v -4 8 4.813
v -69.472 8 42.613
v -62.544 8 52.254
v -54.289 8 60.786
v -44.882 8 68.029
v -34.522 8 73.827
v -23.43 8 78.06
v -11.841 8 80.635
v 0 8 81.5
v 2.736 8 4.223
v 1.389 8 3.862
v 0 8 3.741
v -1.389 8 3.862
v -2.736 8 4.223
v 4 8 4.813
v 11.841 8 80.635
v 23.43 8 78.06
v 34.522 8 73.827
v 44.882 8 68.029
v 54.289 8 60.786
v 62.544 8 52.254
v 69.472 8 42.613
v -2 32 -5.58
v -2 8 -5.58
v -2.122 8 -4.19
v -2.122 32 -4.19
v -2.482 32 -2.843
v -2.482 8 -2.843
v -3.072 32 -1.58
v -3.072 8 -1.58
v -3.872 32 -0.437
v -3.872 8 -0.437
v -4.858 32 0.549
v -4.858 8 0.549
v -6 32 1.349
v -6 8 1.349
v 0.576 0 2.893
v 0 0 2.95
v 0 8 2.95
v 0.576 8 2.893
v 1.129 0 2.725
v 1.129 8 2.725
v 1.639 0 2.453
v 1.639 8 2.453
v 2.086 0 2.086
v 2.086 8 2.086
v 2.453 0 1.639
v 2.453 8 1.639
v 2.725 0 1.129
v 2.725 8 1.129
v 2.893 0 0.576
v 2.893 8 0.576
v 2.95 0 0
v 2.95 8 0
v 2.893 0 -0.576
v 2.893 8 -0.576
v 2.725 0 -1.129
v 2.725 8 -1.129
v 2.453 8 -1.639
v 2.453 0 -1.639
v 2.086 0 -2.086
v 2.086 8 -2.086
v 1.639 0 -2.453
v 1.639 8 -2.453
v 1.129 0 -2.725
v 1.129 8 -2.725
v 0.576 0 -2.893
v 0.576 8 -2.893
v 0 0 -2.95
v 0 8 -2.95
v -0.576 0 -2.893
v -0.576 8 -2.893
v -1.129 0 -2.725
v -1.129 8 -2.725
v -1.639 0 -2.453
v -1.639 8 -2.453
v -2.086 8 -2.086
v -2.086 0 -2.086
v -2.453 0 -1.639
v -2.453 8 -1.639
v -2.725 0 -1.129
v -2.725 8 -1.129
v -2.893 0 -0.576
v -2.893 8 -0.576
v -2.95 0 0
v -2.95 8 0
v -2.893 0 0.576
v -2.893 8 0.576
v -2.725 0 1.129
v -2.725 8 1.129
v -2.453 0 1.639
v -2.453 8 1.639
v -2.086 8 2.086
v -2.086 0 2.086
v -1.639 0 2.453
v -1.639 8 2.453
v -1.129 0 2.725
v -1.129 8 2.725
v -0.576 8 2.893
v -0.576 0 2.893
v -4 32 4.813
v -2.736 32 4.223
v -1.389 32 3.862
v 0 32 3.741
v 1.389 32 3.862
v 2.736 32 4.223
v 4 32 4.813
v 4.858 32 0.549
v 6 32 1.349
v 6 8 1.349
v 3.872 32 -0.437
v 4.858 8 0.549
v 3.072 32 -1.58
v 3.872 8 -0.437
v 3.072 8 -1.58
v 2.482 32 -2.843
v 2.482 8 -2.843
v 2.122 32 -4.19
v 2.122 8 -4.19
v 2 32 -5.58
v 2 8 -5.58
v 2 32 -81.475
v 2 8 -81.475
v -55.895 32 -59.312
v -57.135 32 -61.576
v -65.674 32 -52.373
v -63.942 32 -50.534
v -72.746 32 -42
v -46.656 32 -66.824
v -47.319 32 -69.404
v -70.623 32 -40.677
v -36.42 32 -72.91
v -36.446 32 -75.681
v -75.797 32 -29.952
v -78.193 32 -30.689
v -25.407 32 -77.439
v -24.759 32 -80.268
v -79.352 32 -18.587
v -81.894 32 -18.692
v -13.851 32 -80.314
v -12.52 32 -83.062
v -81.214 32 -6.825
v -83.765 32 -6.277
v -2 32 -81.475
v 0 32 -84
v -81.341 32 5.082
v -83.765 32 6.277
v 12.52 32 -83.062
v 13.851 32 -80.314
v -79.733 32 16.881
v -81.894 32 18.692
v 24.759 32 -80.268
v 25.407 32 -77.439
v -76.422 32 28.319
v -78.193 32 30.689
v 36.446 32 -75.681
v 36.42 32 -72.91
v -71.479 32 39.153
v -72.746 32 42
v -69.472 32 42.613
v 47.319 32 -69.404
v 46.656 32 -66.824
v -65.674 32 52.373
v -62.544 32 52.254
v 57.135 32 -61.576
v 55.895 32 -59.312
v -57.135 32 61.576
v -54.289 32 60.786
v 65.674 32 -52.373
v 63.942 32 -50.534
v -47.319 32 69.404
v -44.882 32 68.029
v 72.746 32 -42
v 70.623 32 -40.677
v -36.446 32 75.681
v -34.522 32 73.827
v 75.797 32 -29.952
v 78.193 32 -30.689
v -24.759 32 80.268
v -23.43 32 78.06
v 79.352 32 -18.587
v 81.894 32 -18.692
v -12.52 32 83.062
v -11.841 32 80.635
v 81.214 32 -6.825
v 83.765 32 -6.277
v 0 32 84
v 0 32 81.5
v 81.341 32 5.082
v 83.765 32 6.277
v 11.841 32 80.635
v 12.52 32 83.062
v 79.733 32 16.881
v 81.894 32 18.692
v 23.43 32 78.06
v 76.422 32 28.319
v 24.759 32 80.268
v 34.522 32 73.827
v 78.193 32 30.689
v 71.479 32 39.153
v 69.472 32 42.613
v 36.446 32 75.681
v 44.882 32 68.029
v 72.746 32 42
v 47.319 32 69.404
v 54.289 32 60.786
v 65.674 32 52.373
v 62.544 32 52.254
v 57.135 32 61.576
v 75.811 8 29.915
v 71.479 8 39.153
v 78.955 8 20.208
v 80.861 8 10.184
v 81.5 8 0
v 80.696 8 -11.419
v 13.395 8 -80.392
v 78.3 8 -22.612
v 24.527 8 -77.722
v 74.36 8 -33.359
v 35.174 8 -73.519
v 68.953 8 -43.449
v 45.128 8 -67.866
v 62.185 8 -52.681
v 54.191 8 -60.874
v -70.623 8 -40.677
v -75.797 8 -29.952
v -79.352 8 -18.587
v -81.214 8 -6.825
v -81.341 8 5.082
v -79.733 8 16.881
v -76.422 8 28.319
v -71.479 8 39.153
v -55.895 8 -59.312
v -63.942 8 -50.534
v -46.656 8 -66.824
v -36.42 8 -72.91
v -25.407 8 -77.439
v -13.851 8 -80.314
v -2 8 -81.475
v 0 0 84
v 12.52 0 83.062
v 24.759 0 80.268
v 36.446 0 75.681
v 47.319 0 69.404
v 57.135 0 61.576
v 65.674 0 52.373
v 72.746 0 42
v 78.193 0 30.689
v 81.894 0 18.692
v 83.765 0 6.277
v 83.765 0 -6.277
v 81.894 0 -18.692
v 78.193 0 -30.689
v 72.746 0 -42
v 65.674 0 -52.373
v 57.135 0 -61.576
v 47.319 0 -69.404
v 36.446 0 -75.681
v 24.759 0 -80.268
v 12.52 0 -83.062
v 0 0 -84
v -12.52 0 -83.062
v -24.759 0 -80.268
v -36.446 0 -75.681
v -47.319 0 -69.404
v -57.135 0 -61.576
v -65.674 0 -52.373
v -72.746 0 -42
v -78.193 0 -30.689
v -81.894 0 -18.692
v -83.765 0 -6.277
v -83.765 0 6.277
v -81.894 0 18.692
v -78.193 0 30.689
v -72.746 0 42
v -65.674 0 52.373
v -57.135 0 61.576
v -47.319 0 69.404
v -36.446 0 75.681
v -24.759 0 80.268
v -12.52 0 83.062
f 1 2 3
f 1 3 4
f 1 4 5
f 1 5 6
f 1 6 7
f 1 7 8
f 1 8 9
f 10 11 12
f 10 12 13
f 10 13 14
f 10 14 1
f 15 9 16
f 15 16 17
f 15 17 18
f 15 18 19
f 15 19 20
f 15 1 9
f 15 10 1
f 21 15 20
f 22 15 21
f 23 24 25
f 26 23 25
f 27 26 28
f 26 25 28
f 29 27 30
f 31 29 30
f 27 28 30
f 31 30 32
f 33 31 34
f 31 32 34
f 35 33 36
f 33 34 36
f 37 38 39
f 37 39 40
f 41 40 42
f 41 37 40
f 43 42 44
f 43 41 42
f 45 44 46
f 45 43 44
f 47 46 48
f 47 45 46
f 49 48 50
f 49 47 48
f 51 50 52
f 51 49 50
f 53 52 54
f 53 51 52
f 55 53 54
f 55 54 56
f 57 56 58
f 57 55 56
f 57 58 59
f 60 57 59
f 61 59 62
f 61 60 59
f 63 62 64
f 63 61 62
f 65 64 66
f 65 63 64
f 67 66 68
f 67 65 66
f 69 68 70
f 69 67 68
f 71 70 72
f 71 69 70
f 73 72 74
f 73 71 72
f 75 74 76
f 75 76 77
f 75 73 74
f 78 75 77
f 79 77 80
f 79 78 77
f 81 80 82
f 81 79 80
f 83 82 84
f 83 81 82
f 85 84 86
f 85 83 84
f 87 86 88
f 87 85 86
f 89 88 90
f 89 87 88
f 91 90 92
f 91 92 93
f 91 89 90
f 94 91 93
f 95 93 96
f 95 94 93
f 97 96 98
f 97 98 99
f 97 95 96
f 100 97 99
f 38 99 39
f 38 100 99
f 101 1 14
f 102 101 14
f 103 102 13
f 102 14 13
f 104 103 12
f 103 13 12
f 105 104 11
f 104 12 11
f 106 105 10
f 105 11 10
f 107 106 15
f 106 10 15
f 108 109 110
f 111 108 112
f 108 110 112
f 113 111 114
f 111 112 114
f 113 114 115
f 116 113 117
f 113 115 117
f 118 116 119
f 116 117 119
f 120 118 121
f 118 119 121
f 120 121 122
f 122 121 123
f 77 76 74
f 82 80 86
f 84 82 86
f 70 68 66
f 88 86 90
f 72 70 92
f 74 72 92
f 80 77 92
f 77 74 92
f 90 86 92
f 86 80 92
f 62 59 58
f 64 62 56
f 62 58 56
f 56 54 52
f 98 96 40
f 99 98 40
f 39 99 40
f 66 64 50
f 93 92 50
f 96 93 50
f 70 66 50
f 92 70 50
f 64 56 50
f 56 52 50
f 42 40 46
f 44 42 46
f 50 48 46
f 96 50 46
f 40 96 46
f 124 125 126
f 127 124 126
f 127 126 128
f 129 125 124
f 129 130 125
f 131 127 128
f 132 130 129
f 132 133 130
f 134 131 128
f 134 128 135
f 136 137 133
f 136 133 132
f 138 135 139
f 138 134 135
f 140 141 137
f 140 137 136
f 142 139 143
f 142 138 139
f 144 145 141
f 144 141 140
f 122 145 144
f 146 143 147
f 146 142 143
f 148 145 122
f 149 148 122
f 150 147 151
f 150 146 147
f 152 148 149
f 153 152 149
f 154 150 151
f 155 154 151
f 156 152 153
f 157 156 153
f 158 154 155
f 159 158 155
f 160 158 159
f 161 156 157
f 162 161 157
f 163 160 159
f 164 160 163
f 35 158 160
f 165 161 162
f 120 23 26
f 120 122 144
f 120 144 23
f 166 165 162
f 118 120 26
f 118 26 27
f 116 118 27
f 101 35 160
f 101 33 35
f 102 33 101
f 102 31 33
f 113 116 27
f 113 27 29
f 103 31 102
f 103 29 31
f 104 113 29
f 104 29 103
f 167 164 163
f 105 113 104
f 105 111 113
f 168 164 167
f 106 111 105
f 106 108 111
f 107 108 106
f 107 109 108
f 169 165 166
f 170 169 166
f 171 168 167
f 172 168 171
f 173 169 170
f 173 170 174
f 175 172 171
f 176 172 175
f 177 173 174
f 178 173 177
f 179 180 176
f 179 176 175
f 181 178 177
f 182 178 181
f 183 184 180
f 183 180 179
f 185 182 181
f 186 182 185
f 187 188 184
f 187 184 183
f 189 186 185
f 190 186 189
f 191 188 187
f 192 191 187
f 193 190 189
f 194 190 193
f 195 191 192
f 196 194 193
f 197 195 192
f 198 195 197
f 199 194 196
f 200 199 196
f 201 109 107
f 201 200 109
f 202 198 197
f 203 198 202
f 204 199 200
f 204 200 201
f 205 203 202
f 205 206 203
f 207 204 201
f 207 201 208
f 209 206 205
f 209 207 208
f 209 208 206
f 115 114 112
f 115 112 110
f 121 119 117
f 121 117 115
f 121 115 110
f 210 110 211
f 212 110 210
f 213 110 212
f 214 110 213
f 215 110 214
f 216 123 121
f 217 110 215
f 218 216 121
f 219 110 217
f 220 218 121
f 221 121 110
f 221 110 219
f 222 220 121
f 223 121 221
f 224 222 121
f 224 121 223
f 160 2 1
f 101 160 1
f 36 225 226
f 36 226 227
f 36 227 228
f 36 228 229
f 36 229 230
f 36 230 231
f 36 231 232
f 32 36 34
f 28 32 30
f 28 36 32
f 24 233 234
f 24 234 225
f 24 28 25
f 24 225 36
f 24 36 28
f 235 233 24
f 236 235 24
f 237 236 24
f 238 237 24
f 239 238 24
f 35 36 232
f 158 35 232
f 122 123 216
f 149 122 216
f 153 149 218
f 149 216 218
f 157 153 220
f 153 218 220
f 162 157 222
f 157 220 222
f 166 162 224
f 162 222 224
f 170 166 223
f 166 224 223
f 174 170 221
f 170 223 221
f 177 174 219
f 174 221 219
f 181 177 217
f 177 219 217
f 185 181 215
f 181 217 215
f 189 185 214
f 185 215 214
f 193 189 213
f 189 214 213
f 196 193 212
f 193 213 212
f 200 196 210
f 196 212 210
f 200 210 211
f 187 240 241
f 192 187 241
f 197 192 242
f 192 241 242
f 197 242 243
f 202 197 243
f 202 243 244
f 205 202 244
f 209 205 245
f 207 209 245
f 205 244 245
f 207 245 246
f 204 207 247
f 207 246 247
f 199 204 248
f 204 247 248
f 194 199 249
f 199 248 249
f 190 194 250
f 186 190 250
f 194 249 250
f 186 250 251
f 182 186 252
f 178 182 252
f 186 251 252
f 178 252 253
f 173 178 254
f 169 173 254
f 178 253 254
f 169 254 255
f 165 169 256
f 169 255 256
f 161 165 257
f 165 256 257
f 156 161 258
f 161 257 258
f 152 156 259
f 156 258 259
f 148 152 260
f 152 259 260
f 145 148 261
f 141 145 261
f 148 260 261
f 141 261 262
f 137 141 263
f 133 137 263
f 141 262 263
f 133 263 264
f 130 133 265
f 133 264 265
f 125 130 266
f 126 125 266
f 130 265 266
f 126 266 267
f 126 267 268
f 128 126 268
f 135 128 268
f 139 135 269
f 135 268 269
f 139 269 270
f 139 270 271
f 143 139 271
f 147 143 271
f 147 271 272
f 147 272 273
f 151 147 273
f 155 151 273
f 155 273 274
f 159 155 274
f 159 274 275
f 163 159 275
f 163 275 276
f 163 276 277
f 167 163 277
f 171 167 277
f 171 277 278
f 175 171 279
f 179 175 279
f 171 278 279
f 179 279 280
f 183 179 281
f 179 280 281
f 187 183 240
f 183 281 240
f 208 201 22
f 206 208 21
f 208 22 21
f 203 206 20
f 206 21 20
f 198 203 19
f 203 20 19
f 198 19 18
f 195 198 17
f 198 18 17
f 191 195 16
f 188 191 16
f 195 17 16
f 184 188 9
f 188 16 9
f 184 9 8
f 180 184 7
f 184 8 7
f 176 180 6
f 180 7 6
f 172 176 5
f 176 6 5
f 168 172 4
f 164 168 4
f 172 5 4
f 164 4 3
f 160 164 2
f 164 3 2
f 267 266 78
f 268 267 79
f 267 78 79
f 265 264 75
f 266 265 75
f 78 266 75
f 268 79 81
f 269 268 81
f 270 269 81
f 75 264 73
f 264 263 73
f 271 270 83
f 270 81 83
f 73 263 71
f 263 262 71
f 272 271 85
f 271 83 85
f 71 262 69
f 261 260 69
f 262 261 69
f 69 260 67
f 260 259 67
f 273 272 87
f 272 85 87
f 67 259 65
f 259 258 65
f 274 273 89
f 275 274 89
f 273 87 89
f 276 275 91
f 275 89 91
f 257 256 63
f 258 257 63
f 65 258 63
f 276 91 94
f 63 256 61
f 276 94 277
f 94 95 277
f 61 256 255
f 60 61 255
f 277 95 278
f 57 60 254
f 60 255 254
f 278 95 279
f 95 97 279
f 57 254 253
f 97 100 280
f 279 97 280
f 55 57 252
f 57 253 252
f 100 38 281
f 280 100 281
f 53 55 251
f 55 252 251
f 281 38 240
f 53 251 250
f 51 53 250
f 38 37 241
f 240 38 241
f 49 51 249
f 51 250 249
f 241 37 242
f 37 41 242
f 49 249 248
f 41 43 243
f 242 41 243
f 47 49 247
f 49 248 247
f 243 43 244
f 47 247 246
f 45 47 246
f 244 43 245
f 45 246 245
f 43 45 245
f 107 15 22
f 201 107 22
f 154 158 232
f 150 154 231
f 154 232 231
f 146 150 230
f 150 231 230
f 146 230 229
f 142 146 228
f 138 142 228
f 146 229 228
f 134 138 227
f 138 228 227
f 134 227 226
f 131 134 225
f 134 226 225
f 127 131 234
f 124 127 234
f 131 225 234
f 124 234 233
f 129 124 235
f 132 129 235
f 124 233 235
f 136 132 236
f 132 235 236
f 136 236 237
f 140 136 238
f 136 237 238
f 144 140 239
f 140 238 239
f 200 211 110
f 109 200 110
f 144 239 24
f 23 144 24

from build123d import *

# Parameters (mm, degrees)
BOSS_EXTRUDE2_DEPTH   = 8
BOSS_EXTRUDE2_2_DEPTH = 8
BOSS_EXTRUDE2_3_DEPTH = 8
SKETCH2_4_R           = 84
BOSS_EXTRUDE3_DEPTH   = 32
SKETCH4_R             = 2.95
CUT_EXTRUDE2_DEPTH    = 8


with BuildPart() as part:
    # Sketch2 → Boss-Extrude2 (new body)
    with BuildSketch(Plane(origin=(0, 0, 0), x_dir=(1, 0, 0), z_dir=(0, 1, 0))):
        with BuildLine():
            Line((-2, 5.579606434), (-2, 81.475456427))
            ThreePointArc((-2, 81.475456427), (-70.623024312, 40.677247166), (-71.479275287, -39.15307401))
            Line((-71.479275287, -39.15307401), (-6, -1.348596796))
            ThreePointArc((-6, -1.348596796), (-3.07179677, 1.579606434), (-2, 5.579606434))
        make_face()
    extrude(amount=BOSS_EXTRUDE2_DEPTH)



with BuildPart() as body_2:
    # Sketch2 → Boss-Extrude2 2 (new body)
    with BuildSketch(Plane(origin=(0, 0, 0), x_dir=(1, 0, 0), z_dir=(0, 1, 0))):
        with BuildLine():
            ThreePointArc((71.479275287, -39.15307401), (70.623024312, 40.677247166), (2, 81.475456427))
            Line((2, 81.475456427), (2, 5.579606434))
            ThreePointArc((2, 5.579606434), (3.07179677, 1.579606434), (6, -1.348596796))
            Line((6, -1.348596796), (71.479275287, -39.15307401))
        make_face()
    extrude(amount=BOSS_EXTRUDE2_2_DEPTH)


with BuildPart() as body_3:
    # Sketch2 → Boss-Extrude2 3 (new body)
    with BuildSketch(Plane(origin=(0, 0, 0), x_dir=(1, 0, 0), z_dir=(0, 1, 0))):
        with BuildLine():
            Line((-4, -4.812698411), (-69.472135836, -42.613053661))
            ThreePointArc((-69.472135836, -42.613053661), (0, -81.5), (69.472135836, -42.613053661))
            Line((69.472135836, -42.613053661), (4, -4.812698411))
            ThreePointArc((4, -4.812698411), (0, -3.740901642), (-4, -4.812698411))
        make_face()
    extrude(amount=BOSS_EXTRUDE2_3_DEPTH)


with BuildPart() as part_1:
    add(part.part)

    add(body_2.part)  # Boss-Extrude3 merges body 2

    add(body_3.part)  # Boss-Extrude3 merges body 3
    # Sketch2<4> → Boss-Extrude3 (add)
    with BuildSketch(Plane(origin=(0, 0, 0), x_dir=(1, 0, 0), z_dir=(0, 1, 0))):
        Circle(SKETCH2_4_R)
        with BuildLine():
            Line((2, 5.579606434), (2, 81.475456427))
            ThreePointArc((2, 81.475456427), (70.623024312, 40.677247166), (71.479275287, -39.15307401))
            Line((71.479275287, -39.15307401), (6, -1.348596796))
            ThreePointArc((6, -1.348596796), (3.07179677, 1.579606434), (2, 5.579606434))
        make_face(mode=Mode.SUBTRACT)
        with BuildLine():
            Line((4, -4.812698411), (69.472135836, -42.613053661))
            ThreePointArc((69.472135836, -42.613053661), (0, -81.5), (-69.472135836, -42.613053661))
            Line((-69.472135836, -42.613053661), (-4, -4.812698411))
            ThreePointArc((-4, -4.812698411), (0, -3.740901642), (4, -4.812698411))
        make_face(mode=Mode.SUBTRACT)
        with BuildLine():
            Line((-6, -1.348596796), (-71.479275287, -39.15307401))
            ThreePointArc((-71.479275287, -39.15307401), (-70.623024312, 40.677247166), (-2, 81.475456427))
            Line((-2, 81.475456427), (-2, 5.579606434))
            ThreePointArc((-2, 5.579606434), (-3.07179677, 1.579606434), (-6, -1.348596796))
        make_face(mode=Mode.SUBTRACT)
    extrude(amount=BOSS_EXTRUDE3_DEPTH)

    # Sketch4 → Cut-Extrude2 (cut)
    with BuildSketch(Plane(origin=(0, 0, 0), x_dir=(1, 0, 0), z_dir=(0, 1, 0))):
        Circle(SKETCH4_R)
    extrude(amount=CUT_EXTRUDE2_DEPTH, mode=Mode.SUBTRACT)


solid = part_1.part
